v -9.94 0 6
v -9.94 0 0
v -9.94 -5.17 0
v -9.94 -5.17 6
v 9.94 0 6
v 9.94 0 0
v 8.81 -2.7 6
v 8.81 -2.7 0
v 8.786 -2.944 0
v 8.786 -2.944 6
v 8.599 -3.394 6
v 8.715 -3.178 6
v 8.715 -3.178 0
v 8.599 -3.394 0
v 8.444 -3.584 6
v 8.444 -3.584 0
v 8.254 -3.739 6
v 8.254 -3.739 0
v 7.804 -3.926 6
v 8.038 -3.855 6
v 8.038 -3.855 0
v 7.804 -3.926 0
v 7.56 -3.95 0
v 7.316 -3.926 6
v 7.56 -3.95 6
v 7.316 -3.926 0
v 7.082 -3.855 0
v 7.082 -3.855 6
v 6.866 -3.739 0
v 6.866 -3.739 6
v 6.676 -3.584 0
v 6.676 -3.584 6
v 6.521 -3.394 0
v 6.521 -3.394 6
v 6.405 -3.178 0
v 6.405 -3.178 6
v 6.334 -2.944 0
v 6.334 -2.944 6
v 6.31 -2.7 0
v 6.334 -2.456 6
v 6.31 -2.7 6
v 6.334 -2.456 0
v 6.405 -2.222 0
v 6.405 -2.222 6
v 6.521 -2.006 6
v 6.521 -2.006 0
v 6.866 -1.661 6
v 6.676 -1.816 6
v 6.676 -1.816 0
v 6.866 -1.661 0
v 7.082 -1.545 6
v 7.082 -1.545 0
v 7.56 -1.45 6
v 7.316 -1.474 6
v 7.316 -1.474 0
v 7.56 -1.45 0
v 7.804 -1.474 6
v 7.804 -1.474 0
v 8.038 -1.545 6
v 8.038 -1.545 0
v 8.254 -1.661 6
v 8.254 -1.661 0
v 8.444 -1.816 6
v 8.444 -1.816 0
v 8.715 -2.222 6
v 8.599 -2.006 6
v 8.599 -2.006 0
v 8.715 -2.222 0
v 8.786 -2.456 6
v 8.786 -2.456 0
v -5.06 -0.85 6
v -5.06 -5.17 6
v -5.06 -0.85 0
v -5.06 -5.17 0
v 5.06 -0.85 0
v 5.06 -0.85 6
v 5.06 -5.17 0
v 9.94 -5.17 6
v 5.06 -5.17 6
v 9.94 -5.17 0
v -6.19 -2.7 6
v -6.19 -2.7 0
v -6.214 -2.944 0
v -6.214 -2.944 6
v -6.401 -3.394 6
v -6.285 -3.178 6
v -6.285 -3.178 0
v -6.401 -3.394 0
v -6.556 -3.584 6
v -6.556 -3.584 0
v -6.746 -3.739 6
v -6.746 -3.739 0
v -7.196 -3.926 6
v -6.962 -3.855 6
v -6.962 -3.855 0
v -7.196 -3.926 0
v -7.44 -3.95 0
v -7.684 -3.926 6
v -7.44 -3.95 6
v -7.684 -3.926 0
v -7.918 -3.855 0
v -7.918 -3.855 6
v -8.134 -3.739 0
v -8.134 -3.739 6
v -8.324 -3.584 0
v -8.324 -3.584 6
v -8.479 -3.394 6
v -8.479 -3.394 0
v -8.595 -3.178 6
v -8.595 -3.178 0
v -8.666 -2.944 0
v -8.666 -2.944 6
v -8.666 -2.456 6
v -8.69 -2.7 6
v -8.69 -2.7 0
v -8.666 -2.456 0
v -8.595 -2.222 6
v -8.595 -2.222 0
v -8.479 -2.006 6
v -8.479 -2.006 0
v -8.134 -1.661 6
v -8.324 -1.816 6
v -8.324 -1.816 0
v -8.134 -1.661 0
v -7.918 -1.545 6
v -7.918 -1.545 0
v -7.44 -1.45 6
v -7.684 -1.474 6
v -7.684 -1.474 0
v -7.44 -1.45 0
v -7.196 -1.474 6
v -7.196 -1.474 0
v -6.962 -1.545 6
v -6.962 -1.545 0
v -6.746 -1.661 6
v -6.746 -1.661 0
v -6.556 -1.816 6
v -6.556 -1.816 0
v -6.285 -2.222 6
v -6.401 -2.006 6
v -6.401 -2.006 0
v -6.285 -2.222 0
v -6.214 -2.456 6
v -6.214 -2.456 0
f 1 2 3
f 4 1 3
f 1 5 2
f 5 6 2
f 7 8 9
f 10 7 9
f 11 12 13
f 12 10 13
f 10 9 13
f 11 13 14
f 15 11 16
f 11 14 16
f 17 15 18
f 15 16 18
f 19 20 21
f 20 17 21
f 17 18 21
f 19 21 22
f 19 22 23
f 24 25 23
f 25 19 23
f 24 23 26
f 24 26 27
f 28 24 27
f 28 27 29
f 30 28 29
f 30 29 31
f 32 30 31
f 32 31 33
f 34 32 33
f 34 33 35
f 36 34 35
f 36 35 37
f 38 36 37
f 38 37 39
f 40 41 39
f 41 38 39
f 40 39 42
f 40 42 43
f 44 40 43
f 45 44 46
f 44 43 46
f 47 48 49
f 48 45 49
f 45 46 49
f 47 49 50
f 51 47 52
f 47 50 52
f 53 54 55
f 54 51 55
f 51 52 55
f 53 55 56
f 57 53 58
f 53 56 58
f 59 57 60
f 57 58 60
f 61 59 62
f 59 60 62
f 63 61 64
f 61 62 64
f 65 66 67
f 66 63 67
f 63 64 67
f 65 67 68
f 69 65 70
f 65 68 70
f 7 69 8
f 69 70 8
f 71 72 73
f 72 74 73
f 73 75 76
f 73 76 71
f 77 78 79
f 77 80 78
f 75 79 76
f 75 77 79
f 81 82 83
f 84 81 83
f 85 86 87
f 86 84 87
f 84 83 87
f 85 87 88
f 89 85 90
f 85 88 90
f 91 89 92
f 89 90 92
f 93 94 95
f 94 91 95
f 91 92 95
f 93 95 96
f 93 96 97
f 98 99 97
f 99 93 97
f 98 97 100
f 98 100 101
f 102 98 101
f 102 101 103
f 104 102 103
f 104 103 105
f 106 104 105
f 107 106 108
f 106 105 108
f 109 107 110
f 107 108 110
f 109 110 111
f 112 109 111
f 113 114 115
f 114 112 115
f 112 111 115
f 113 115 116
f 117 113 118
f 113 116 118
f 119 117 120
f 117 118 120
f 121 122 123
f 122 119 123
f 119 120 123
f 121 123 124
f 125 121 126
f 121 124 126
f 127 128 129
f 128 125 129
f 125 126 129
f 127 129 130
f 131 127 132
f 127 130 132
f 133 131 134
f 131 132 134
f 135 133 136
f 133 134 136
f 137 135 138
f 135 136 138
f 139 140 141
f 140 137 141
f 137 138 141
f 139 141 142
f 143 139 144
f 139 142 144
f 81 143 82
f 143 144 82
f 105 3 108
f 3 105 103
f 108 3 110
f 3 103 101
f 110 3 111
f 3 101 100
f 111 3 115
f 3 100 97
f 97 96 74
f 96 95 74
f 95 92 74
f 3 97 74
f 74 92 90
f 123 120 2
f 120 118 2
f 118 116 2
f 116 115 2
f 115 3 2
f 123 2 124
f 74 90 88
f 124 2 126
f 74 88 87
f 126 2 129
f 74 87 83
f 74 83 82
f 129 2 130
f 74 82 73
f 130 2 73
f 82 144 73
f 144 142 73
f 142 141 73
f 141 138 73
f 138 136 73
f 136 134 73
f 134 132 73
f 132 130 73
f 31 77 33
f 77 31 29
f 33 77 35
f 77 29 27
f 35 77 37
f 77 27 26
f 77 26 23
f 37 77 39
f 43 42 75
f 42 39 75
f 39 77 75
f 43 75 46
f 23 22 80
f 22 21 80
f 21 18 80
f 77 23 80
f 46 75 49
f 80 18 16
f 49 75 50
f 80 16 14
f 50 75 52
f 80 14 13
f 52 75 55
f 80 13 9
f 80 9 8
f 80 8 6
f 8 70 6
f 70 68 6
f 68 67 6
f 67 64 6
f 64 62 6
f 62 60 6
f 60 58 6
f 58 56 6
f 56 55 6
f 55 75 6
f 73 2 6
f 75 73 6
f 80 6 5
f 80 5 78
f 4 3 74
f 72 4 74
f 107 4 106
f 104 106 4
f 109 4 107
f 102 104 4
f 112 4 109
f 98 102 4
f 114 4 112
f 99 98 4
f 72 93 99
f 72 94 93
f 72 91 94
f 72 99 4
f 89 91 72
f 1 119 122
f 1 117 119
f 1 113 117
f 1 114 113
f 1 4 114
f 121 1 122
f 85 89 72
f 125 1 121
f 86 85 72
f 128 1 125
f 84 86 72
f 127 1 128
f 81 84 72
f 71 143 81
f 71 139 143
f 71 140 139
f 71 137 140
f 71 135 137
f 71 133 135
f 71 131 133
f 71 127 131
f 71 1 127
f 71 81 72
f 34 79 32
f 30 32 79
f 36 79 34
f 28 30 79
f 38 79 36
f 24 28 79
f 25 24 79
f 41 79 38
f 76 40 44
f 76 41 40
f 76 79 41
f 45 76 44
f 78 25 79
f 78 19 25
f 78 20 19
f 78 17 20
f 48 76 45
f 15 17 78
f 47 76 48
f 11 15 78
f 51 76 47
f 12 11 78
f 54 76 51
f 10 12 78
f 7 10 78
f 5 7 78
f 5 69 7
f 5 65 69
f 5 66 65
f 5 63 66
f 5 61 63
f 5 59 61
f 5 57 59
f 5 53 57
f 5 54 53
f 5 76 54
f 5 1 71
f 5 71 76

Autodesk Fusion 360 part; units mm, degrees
sketch "Sketch1" plane through (0, 0, 0) normal (0, 0, 1) x (1, 0, 0)
  line L0 (-5.06, 0) -> (-9.94, 0)
  line L1 (-9.94, 0) -> (-9.94, -5.17)
  line L2 (-9.94, -5.17) -> (-5.06, -5.17)
  line L3 (-5.06, -5.17) -> (-5.06, 0)
  line L4 (-9.94, 0) -> (5.06, 0)
  line L5 (5.06, 0) -> (9.94, 0)
  line L6 (9.94, 0) -> (9.94, -5.17)
  line L7 (9.94, -5.17) -> (5.06, -5.17)
  line L8 (5.06, -5.17) -> (5.06, 0)
  line L9 (-5.06, 0) -> (5.06, 0)
  line L10 (5.06, 0) -> (5.06, -0.85)
  line L11 (5.06, -0.85) -> (-5.06, -0.85)
  line L12 (-5.06, -0.85) -> (-5.06, 0)
  circle A0 centre (7.56, -2.7) radius 1.25
  circle A1 centre (-7.44, -2.7) radius 1.25
  line L13 (-7.44, -2.7) -> (-5.06, -2.7) construction
  line L14 (-7.44, -2.7) -> (-7.44, 0) construction
  line L15 (7.56, -2.7) -> (7.56, 0) construction
  line L16 (7.56, -2.7) -> (9.94, -2.7) construction
  dimension "d1" = 4.88
  dimension "d2" = 5.17
  dimension "d4" = 0.85
  dimension "d5" = 2.5
  dimension "d6" = 2.7
  dimension "d7" = 2.5
  dimension "d10" = 15
extrude "Extrude1" add sketch "Sketch1" along normal blind 6
